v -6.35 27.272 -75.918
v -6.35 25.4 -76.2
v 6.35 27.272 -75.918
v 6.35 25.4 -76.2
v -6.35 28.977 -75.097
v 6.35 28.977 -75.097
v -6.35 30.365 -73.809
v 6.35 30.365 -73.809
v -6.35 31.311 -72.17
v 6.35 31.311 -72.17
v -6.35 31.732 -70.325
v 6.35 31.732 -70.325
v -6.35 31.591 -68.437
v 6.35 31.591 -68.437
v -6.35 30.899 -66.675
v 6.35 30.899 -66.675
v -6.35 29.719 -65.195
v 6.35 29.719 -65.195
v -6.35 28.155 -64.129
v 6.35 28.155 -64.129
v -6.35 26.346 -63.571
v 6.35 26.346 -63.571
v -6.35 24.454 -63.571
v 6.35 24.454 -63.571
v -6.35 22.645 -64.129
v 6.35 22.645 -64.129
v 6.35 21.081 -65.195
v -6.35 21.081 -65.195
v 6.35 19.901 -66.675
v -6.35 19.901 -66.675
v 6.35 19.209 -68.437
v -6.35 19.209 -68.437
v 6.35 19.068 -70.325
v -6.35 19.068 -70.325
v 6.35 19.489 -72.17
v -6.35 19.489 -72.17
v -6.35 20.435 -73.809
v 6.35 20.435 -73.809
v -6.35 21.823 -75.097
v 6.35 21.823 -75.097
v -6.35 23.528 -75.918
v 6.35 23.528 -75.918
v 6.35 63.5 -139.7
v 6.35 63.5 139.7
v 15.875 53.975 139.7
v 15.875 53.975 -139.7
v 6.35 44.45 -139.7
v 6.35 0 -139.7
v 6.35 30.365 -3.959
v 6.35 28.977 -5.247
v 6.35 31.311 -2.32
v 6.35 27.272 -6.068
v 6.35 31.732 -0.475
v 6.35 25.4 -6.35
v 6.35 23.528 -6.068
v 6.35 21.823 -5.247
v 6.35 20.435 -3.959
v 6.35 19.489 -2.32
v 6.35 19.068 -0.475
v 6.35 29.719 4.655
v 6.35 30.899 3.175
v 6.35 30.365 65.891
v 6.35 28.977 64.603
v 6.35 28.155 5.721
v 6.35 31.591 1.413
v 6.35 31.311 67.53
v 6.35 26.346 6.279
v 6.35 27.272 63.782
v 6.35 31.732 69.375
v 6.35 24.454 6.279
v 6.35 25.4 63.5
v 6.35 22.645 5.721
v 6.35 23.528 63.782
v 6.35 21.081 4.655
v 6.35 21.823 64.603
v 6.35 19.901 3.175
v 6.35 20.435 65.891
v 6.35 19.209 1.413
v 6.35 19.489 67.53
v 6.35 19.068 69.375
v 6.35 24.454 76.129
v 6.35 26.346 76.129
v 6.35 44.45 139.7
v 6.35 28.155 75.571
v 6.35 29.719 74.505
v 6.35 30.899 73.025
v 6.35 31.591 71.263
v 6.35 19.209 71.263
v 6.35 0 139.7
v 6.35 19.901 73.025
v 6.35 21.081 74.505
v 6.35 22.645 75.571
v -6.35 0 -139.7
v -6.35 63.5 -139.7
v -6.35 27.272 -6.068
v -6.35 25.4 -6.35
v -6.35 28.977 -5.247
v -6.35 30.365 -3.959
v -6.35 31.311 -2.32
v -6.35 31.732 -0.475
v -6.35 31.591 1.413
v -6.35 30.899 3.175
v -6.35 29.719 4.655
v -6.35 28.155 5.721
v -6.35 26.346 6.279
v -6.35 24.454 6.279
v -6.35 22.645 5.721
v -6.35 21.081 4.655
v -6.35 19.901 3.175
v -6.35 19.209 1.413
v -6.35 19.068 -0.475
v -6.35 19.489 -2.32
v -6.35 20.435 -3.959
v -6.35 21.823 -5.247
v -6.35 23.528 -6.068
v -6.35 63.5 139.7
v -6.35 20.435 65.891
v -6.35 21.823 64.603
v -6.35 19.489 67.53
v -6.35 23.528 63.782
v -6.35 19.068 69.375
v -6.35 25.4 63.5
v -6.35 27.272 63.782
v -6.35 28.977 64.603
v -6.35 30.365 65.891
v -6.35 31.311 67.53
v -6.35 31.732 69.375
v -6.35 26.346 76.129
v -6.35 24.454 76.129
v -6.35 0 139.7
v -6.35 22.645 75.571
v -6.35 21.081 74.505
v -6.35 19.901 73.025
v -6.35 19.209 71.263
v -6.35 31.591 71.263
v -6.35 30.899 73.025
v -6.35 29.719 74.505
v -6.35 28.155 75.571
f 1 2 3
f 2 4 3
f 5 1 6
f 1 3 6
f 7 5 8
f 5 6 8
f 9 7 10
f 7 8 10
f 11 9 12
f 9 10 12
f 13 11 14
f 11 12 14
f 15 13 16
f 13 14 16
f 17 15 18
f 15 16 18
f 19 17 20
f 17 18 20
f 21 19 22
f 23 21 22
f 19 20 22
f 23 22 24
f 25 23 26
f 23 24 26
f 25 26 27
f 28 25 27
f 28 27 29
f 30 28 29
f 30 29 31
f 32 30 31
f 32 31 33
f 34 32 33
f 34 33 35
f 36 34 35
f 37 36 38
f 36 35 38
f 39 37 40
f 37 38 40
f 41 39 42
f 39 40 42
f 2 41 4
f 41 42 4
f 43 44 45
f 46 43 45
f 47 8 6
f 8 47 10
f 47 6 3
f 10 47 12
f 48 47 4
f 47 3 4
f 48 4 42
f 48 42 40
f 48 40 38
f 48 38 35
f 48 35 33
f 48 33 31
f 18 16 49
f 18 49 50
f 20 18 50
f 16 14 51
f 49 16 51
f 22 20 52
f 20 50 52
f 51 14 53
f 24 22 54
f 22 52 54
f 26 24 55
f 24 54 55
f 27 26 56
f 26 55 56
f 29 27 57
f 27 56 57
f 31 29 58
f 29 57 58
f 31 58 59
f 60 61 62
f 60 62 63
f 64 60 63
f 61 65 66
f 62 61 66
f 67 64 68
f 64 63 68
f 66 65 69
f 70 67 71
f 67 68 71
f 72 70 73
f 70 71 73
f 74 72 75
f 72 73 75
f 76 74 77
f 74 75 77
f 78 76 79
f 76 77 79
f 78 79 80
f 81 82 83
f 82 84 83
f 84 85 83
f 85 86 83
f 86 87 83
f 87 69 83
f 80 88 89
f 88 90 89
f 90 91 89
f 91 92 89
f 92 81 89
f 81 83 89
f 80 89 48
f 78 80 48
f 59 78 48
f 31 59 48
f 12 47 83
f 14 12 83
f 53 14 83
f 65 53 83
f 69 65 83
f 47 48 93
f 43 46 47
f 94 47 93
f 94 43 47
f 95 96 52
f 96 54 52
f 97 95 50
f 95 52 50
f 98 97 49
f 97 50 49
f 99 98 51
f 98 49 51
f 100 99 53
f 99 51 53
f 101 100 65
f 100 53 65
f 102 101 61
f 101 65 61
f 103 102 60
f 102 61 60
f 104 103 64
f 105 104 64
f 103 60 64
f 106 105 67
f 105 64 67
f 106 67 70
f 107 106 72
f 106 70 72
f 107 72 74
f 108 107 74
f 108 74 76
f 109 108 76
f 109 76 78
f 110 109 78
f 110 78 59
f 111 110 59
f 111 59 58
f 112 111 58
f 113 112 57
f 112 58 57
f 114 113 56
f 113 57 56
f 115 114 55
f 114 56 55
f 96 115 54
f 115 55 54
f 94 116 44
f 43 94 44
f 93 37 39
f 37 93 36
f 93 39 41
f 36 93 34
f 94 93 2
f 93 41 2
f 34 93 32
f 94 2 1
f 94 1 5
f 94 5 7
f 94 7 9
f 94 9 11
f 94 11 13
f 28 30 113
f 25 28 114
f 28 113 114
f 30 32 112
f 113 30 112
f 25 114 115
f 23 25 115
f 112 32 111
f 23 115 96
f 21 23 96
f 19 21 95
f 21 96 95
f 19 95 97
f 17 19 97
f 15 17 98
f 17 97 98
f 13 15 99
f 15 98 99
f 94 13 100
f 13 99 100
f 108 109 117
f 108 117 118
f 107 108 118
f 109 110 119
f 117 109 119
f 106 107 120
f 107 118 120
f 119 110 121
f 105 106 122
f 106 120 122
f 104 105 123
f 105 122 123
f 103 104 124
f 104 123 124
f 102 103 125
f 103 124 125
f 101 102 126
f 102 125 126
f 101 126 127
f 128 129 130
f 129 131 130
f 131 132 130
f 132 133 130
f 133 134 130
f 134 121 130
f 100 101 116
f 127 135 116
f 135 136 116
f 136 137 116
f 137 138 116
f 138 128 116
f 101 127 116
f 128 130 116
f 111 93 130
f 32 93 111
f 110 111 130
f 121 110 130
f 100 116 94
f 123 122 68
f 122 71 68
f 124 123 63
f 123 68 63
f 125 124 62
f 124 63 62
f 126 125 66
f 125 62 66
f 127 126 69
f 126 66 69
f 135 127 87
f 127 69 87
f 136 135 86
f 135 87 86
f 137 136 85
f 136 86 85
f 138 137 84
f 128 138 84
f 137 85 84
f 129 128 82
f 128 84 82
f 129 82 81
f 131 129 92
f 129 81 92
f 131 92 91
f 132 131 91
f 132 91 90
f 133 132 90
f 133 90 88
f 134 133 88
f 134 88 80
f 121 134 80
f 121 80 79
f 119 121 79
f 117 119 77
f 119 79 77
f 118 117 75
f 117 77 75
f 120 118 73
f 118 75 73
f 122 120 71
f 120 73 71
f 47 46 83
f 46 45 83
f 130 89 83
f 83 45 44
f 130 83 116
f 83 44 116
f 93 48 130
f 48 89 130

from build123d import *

# Parameters (mm, degrees)
BOSS_EXTRUDE1_DEPTH = 139.7
SKETCH2_R           = 6.35
CUT_EXTRUDE1_DEPTH  = 38.1


with BuildPart() as part:
    # Sketch1 → Boss-Extrude1 (new, symmetric)
    with BuildSketch(Plane.XY):
        Polygon((6.35, 63.5), (15.875, 53.975), (6.35, 44.45), (6.35, 0), (-6.35, 0), (-6.35, 63.5), align=None)
    extrude(amount=BOSS_EXTRUDE1_DEPTH, both=True)

    # Sketch2 → Cut-Extrude1 (cut, symmetric)
    with BuildSketch(Plane(origin=(0, 0, 0), x_dir=(0, 0, -1), z_dir=(1, 0, 0))):
        with Locations((-69.85, 25.4)):
            Circle(SKETCH2_R)
        with Locations((0, 25.4)):
            Circle(SKETCH2_R)
        with Locations((69.85, 25.4)):
            Circle(SKETCH2_R)
    extrude(amount=CUT_EXTRUDE1_DEPTH, both=True, mode=Mode.SUBTRACT)


solid = part.part
